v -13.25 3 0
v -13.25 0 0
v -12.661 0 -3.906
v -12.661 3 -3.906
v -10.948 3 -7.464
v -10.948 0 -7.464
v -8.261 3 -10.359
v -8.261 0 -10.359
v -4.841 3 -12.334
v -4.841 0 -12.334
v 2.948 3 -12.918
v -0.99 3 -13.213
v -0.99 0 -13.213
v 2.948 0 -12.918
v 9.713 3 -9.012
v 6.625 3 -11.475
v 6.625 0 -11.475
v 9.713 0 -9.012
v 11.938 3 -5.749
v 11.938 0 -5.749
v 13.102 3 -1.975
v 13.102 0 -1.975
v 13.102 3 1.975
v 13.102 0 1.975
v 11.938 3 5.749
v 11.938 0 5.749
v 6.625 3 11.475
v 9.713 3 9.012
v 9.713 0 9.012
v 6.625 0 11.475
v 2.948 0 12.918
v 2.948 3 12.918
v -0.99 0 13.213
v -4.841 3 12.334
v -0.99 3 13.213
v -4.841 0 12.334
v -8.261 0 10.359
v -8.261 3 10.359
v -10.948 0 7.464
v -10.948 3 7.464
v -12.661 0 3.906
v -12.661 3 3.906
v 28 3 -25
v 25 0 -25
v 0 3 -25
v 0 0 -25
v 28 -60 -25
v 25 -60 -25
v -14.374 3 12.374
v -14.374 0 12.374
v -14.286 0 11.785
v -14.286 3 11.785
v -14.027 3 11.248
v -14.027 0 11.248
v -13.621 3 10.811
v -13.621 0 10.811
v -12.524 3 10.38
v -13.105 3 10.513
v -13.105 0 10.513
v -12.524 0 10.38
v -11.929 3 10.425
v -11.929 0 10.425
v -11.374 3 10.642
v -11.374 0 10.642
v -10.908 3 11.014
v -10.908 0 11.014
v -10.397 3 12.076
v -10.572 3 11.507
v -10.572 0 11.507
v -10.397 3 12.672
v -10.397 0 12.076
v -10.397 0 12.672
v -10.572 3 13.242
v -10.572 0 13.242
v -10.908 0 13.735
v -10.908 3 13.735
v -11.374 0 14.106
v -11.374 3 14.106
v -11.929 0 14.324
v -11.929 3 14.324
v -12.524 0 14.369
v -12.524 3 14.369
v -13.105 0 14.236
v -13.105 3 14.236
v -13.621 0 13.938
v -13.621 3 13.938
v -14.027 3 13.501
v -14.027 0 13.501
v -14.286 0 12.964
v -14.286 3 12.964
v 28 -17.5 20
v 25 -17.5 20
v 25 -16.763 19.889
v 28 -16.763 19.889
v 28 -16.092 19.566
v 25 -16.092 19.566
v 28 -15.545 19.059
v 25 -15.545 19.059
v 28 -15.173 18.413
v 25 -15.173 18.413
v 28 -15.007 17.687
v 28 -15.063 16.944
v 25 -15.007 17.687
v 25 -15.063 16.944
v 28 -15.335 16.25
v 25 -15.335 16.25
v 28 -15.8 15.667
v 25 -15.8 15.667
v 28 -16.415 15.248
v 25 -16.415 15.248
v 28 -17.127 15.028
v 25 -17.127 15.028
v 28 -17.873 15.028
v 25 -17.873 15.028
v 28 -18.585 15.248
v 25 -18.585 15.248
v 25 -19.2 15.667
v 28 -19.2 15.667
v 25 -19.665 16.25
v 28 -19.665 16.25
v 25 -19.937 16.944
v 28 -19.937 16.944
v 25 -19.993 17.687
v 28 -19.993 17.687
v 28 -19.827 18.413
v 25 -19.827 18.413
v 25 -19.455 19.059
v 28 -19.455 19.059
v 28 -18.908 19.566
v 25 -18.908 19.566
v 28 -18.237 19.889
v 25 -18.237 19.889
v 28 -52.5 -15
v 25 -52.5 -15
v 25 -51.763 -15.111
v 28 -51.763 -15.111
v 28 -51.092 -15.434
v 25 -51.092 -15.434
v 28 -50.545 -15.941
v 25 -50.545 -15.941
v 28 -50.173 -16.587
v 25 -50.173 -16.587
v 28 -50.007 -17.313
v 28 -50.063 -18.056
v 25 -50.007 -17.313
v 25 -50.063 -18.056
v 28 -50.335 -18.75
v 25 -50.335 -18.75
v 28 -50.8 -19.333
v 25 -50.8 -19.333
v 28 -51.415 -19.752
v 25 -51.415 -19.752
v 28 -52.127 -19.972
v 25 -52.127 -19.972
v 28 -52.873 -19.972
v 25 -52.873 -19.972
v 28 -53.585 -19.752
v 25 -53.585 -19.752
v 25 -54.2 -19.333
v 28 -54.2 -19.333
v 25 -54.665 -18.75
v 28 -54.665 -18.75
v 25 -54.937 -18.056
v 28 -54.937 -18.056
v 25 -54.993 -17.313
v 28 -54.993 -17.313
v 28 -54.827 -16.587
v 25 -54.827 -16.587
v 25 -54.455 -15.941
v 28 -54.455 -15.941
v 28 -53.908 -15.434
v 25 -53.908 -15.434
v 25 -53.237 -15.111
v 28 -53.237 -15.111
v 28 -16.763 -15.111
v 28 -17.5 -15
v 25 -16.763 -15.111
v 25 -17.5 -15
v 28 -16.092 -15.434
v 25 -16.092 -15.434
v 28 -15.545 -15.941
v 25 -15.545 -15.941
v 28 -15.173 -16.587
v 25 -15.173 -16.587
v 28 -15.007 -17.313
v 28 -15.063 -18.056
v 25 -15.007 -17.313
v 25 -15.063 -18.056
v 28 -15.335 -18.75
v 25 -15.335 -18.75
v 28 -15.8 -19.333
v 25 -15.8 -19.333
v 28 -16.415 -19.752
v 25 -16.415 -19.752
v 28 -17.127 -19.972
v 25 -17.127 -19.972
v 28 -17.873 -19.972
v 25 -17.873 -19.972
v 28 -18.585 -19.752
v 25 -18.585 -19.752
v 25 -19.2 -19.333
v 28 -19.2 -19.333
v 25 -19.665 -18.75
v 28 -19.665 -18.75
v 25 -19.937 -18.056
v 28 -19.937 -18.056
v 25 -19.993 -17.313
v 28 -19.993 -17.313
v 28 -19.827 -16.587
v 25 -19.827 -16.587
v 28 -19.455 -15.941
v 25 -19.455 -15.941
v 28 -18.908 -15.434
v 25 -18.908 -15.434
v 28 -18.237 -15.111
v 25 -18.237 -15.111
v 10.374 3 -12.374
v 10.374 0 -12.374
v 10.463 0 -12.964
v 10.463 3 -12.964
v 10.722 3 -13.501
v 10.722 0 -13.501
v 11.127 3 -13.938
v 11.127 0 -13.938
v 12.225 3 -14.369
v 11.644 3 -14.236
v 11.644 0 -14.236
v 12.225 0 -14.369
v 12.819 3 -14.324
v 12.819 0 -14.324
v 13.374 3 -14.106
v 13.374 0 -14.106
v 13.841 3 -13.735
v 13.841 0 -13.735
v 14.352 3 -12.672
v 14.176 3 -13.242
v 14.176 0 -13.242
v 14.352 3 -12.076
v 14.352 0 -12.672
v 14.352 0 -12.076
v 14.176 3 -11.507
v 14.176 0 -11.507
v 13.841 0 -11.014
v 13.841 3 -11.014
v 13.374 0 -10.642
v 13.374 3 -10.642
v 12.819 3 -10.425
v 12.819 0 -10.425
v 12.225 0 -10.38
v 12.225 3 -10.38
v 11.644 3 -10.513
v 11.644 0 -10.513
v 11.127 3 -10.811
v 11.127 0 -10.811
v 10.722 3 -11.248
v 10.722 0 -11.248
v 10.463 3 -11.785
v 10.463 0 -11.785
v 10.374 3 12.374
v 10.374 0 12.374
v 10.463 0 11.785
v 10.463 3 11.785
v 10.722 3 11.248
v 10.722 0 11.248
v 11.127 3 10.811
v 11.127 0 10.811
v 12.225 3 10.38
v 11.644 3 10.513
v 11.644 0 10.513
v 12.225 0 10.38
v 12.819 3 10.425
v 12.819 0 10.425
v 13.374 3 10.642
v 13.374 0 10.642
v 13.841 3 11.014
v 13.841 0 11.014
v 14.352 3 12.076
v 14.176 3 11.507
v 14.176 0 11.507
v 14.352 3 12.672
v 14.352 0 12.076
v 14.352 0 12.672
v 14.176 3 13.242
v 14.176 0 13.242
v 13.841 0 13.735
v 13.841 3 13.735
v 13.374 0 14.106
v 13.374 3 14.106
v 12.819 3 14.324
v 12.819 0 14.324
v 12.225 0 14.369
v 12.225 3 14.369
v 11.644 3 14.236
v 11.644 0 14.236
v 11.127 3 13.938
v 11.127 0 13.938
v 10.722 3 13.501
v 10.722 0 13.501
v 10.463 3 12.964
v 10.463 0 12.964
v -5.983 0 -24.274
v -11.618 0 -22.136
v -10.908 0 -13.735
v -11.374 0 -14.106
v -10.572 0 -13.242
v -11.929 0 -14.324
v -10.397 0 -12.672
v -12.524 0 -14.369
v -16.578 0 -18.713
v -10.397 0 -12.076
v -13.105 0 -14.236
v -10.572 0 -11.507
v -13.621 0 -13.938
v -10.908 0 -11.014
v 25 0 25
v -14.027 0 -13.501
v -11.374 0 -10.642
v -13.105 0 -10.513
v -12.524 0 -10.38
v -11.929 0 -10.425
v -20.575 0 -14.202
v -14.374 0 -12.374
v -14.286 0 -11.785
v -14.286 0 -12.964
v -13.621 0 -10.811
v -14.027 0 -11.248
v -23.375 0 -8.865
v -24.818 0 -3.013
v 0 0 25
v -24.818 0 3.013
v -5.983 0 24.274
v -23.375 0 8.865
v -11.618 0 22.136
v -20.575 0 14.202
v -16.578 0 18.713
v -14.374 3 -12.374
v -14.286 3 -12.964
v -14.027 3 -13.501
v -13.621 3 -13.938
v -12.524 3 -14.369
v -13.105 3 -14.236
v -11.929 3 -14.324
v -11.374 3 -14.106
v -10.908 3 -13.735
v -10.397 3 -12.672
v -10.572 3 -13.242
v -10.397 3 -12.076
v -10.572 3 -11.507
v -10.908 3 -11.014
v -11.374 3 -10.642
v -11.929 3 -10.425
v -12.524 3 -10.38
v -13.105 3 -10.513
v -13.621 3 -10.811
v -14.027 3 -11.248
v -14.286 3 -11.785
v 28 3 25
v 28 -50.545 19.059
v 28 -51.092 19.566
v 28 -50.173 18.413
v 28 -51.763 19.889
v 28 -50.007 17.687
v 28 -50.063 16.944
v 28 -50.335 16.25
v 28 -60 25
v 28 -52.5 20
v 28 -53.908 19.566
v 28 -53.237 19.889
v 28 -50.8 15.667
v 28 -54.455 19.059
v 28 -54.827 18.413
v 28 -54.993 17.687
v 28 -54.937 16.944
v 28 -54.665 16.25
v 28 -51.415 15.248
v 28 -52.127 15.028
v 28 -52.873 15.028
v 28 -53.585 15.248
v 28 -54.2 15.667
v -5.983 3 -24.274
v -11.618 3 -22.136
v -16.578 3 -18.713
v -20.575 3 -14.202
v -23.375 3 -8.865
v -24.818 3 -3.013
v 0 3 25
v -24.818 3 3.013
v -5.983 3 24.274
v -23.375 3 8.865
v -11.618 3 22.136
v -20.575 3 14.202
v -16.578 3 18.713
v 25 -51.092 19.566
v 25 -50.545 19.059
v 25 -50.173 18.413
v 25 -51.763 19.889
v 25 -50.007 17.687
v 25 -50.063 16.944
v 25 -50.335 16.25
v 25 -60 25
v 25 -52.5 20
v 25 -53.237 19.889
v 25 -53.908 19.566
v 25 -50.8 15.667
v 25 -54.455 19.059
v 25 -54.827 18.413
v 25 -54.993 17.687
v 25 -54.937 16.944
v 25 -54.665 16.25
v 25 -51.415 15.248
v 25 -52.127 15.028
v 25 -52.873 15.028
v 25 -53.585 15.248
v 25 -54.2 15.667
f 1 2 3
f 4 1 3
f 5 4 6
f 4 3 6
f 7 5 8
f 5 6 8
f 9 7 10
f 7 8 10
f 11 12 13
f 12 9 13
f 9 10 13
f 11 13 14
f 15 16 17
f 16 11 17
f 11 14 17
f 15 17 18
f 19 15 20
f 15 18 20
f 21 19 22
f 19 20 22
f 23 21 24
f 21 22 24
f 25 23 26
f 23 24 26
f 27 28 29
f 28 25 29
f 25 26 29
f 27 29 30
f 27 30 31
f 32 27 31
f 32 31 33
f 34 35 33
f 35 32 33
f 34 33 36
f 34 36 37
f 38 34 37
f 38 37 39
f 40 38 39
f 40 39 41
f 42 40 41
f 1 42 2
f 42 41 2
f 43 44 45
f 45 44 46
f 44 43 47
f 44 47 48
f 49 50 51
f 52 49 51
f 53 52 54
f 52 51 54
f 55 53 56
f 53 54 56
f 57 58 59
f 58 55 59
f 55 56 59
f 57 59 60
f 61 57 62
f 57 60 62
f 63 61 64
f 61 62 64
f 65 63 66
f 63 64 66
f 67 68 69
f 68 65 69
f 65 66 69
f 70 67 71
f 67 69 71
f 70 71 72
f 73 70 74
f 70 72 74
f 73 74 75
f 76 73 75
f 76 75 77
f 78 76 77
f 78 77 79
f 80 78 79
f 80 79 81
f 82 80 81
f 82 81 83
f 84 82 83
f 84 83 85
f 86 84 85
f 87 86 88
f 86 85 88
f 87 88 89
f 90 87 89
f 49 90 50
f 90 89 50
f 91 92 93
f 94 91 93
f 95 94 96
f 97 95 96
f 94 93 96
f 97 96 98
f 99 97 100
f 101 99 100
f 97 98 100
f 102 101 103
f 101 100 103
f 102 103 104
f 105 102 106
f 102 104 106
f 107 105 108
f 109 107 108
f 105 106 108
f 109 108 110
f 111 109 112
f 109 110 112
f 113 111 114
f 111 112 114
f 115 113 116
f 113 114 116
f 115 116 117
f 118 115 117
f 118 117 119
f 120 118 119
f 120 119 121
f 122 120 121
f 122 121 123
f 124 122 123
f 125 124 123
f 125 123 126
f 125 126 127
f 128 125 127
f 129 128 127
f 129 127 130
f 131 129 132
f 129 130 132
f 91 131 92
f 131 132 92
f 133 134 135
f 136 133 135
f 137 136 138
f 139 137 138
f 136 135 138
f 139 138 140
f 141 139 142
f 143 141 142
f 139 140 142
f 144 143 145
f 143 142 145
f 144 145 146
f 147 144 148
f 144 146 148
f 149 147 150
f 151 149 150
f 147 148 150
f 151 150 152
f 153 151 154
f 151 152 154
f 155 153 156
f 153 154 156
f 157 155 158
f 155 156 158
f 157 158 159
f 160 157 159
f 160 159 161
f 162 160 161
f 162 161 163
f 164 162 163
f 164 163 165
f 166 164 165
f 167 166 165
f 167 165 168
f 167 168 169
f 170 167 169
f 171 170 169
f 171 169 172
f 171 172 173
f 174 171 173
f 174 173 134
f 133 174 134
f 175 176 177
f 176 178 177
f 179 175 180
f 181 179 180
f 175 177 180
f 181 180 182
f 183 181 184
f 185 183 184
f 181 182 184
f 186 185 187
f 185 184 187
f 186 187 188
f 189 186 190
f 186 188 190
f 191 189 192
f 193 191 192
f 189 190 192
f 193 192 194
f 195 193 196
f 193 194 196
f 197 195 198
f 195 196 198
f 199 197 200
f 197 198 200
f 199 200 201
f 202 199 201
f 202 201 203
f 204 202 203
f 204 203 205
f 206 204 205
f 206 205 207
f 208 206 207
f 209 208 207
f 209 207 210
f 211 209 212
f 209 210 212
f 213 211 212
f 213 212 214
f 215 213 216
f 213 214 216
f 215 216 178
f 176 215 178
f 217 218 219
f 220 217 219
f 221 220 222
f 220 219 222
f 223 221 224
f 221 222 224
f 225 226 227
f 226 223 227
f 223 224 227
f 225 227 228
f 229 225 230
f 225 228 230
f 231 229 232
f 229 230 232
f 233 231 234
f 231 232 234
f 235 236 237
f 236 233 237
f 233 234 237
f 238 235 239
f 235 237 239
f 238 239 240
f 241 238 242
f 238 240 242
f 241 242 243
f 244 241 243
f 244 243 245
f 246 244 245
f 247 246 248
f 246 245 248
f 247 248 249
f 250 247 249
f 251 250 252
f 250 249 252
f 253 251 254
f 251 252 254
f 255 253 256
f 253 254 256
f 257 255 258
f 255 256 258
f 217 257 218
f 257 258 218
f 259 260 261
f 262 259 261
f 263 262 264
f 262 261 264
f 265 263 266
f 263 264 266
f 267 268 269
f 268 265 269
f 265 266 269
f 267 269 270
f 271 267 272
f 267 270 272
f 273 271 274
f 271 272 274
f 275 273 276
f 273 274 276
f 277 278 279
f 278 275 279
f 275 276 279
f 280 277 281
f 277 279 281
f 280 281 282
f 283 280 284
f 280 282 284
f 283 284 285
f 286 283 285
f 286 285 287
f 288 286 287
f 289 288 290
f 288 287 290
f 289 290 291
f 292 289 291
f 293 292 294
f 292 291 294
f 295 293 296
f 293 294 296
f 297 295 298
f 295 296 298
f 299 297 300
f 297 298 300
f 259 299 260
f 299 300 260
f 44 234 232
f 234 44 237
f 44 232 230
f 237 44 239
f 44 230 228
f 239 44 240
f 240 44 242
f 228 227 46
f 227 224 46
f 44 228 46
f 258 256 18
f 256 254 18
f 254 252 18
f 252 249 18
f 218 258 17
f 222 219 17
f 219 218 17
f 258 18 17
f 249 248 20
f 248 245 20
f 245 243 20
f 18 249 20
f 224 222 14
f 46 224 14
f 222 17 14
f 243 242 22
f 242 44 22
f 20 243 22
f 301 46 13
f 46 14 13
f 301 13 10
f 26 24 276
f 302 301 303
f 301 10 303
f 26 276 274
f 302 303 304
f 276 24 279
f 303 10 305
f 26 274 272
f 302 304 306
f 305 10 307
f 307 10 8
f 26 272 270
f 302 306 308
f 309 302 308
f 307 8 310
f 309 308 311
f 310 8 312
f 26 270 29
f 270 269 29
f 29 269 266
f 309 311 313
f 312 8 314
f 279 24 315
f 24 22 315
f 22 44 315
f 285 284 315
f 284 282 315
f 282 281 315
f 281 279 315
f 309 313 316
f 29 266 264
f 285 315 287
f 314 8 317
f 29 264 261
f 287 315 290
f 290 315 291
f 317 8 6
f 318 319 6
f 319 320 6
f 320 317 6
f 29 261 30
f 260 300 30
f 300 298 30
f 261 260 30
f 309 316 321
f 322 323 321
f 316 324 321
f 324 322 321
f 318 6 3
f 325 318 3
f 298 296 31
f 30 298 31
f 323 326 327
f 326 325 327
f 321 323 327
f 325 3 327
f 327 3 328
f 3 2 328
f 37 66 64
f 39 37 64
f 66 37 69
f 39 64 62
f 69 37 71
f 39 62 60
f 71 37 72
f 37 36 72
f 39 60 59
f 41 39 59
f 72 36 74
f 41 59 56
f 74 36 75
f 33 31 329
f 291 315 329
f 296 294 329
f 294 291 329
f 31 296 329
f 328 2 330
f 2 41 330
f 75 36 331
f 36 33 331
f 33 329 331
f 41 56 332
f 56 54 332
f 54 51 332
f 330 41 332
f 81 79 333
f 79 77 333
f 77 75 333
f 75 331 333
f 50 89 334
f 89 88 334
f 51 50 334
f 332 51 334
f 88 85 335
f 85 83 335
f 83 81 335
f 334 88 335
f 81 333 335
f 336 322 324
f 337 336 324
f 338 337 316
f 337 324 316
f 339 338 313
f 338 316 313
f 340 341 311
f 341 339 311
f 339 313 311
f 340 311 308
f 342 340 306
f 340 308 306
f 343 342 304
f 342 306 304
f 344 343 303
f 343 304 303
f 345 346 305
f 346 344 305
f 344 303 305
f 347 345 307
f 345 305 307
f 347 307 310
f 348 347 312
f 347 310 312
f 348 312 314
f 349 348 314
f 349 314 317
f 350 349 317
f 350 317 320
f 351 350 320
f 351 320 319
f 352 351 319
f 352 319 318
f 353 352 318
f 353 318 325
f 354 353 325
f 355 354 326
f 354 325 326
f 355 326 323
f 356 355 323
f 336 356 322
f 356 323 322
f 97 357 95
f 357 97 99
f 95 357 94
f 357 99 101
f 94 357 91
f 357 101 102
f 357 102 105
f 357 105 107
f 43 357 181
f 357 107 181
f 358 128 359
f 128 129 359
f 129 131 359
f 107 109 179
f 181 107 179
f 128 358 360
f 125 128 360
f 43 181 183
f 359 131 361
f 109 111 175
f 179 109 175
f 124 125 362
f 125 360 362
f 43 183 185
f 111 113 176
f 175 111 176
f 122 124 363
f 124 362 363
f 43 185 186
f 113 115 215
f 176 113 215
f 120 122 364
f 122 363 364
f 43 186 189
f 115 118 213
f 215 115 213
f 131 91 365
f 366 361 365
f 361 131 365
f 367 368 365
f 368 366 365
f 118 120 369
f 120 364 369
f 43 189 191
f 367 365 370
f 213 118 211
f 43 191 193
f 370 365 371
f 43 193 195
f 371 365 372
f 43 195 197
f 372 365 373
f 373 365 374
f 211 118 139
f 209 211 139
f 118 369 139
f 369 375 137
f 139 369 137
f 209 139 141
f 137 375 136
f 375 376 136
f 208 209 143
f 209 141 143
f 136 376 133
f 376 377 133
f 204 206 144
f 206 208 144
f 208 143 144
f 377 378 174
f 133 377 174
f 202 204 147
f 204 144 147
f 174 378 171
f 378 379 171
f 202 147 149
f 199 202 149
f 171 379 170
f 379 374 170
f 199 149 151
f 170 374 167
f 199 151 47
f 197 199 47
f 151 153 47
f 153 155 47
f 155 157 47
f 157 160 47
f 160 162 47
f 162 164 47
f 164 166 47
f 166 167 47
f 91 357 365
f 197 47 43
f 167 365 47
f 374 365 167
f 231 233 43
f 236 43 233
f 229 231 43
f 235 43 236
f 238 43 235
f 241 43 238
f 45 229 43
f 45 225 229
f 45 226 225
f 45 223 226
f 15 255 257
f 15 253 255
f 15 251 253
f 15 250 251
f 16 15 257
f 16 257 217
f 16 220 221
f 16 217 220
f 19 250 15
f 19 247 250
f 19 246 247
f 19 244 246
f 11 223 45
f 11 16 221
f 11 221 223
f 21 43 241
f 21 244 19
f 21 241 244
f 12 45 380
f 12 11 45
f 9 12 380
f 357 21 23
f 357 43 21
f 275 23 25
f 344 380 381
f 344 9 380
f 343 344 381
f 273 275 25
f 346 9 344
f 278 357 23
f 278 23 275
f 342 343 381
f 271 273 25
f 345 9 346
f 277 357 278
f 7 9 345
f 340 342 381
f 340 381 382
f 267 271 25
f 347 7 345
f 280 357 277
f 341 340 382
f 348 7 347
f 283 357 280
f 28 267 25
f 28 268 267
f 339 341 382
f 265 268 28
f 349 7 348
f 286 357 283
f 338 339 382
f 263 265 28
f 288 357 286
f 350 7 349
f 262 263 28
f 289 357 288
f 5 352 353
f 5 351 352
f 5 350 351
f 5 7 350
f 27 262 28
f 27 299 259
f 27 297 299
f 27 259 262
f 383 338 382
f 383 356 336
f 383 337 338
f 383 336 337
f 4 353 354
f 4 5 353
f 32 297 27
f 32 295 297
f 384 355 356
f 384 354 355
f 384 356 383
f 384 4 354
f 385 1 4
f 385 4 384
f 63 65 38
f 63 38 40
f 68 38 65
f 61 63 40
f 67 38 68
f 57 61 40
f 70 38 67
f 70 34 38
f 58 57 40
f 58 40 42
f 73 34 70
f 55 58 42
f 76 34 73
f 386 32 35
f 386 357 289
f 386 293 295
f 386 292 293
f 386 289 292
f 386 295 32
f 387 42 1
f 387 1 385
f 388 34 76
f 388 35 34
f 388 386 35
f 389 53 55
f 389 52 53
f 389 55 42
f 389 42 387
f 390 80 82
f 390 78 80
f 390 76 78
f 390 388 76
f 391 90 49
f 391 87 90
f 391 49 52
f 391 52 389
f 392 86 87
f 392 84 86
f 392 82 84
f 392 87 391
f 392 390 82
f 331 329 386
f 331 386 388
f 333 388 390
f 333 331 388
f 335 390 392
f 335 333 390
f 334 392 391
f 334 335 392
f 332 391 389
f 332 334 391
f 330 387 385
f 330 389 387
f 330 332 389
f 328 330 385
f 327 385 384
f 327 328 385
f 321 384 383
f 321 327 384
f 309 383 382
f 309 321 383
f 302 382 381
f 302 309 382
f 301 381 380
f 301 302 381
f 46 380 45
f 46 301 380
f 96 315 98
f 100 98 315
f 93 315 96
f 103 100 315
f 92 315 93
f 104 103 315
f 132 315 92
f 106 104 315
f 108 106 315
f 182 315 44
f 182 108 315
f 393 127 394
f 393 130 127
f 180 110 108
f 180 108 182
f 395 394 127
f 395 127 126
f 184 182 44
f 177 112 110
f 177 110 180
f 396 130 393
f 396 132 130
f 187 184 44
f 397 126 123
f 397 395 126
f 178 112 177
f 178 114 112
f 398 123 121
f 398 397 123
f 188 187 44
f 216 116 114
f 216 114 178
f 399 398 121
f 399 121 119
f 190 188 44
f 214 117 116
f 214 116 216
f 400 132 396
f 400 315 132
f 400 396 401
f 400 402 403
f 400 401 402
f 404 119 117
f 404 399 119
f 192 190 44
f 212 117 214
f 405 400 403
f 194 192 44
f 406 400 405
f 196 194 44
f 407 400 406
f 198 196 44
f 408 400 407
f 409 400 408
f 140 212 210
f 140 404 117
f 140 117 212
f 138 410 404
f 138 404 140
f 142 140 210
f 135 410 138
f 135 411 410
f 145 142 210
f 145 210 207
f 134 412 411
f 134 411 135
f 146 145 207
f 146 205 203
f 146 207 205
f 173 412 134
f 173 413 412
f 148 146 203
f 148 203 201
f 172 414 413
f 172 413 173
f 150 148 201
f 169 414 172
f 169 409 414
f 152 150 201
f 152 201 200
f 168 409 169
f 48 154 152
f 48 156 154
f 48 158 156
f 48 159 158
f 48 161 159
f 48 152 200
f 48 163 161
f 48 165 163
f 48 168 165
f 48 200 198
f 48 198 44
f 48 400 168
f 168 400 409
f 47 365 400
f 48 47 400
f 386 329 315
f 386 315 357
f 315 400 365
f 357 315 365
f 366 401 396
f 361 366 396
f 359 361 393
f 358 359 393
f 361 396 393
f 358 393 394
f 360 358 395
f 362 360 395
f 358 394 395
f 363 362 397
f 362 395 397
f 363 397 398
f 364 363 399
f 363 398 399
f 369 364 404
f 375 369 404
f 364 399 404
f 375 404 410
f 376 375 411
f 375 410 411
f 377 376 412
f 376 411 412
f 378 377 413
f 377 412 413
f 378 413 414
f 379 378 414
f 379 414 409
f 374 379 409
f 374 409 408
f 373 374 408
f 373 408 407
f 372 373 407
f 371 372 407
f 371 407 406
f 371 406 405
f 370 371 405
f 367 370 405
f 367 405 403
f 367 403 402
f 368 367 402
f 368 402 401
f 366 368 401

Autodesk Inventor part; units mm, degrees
ref_plane "YZ Plane" through (0, 0, 0) normal (1, 0, 0) x (0, 1, 0)
ref_plane "XZ Plane" through (0, 0, 0) normal (0, 1, 0) x (-1, 0, 0)
ref_plane "XY Plane" through (0, 0, 0) normal (0, 0, 1) x (1, 0, 0)
sketch "Sketch1" plane through (0, 0, 0) normal (0, 1, 0) x (-1, 0, 0)
  circle A0 centre (0, 0) radius 13.25
  line L0 (0, 0) -> (12.3744, 12.3744) construction
  line L1 (0, 0) -> (17.5, 0) construction
  line L2 (0, 0) -> (-12.3744, -12.3744) construction
  line L3 (0, 0) -> (17.5, 0) construction
  circle A1 centre (-12.3744, -12.3744) radius 2
  circle A2 centre (12.3744, 12.3744) radius 2
  circle A3 centre (12.3744, -12.3744) radius 2
  circle A4 centre (-12.3744, 12.3744) radius 2
  circle A5 centre (0, 0) radius 17.5 construction
  arc A6 (0, -25) -> (0, 25) centre (0, 0) ccw
  line L4 (0, 25) -> (-25, 25)
  line L5 (-25, 25) -> (-25, -25)
  line L6 (-25, -25) -> (0, -25)
  line L7 (-25, 25) -> (-28, 25)
  line L8 (-28, 25) -> (-28, -25)
  line L9 (-28, -25) -> (-25, -25)
  line L10 (-25, -25) -> (-25, 25)
  dimension "d0" = 26.5
  dimension "d1" = 17.5
  dimension "d2" = 45
  dimension "d3" = 17.5
  dimension "d4" = 135
  dimension "d5" = 4
  dimension "d6" = 4
  dimension "d7" = 50
  dimension "d10" = 3
extrude "Extrusion1" add sketch "Sketch1" along normal blind 3 contours L6 L5 L4 A6
extrude "Extrusion2" add sketch "Sketch1" along normal blind 3 and the other way blind 60 contours L9 L8 L7 L5
sketch "Sketch2" plane through (25, 0, -25) normal (-1, 0, 0) x (0, 0, 1)
  line L0 (50, -60) -> (50, 0) construction
  line L1 (0, -10) -> (50, -60) construction
  line L2 (7.5, -17.5) -> (42.5, -17.5) construction
  line L3 (42.5, -17.5) -> (42.5, -52.5) construction
  line L4 (42.5, -52.5) -> (7.5, -52.5) construction
  line L5 (7.5, -52.5) -> (7.5, -17.5) construction
  line L6 (7.5, -17.5) -> (42.5, -52.5) construction
  line L7 (42.5, -17.5) -> (7.5, -52.5) construction
  circle A0 centre (7.5, -17.5) radius 2.5
  circle A1 centre (42.5, -17.5) radius 2.5
  circle A2 centre (42.5, -52.5) radius 2.5
  circle A3 centre (7.5, -52.5) radius 2.5
  point P0 (25, 0)
  point P1 (25, -35)
  dimension "d15" = 35
  dimension "d16" = 35
  dimension "d17" = 5
extrude "Extrusion3" cut sketch "Sketch2" against normal blind 5
properties part number "Foundation-Motor-Mount" material "Steel, Mild"
